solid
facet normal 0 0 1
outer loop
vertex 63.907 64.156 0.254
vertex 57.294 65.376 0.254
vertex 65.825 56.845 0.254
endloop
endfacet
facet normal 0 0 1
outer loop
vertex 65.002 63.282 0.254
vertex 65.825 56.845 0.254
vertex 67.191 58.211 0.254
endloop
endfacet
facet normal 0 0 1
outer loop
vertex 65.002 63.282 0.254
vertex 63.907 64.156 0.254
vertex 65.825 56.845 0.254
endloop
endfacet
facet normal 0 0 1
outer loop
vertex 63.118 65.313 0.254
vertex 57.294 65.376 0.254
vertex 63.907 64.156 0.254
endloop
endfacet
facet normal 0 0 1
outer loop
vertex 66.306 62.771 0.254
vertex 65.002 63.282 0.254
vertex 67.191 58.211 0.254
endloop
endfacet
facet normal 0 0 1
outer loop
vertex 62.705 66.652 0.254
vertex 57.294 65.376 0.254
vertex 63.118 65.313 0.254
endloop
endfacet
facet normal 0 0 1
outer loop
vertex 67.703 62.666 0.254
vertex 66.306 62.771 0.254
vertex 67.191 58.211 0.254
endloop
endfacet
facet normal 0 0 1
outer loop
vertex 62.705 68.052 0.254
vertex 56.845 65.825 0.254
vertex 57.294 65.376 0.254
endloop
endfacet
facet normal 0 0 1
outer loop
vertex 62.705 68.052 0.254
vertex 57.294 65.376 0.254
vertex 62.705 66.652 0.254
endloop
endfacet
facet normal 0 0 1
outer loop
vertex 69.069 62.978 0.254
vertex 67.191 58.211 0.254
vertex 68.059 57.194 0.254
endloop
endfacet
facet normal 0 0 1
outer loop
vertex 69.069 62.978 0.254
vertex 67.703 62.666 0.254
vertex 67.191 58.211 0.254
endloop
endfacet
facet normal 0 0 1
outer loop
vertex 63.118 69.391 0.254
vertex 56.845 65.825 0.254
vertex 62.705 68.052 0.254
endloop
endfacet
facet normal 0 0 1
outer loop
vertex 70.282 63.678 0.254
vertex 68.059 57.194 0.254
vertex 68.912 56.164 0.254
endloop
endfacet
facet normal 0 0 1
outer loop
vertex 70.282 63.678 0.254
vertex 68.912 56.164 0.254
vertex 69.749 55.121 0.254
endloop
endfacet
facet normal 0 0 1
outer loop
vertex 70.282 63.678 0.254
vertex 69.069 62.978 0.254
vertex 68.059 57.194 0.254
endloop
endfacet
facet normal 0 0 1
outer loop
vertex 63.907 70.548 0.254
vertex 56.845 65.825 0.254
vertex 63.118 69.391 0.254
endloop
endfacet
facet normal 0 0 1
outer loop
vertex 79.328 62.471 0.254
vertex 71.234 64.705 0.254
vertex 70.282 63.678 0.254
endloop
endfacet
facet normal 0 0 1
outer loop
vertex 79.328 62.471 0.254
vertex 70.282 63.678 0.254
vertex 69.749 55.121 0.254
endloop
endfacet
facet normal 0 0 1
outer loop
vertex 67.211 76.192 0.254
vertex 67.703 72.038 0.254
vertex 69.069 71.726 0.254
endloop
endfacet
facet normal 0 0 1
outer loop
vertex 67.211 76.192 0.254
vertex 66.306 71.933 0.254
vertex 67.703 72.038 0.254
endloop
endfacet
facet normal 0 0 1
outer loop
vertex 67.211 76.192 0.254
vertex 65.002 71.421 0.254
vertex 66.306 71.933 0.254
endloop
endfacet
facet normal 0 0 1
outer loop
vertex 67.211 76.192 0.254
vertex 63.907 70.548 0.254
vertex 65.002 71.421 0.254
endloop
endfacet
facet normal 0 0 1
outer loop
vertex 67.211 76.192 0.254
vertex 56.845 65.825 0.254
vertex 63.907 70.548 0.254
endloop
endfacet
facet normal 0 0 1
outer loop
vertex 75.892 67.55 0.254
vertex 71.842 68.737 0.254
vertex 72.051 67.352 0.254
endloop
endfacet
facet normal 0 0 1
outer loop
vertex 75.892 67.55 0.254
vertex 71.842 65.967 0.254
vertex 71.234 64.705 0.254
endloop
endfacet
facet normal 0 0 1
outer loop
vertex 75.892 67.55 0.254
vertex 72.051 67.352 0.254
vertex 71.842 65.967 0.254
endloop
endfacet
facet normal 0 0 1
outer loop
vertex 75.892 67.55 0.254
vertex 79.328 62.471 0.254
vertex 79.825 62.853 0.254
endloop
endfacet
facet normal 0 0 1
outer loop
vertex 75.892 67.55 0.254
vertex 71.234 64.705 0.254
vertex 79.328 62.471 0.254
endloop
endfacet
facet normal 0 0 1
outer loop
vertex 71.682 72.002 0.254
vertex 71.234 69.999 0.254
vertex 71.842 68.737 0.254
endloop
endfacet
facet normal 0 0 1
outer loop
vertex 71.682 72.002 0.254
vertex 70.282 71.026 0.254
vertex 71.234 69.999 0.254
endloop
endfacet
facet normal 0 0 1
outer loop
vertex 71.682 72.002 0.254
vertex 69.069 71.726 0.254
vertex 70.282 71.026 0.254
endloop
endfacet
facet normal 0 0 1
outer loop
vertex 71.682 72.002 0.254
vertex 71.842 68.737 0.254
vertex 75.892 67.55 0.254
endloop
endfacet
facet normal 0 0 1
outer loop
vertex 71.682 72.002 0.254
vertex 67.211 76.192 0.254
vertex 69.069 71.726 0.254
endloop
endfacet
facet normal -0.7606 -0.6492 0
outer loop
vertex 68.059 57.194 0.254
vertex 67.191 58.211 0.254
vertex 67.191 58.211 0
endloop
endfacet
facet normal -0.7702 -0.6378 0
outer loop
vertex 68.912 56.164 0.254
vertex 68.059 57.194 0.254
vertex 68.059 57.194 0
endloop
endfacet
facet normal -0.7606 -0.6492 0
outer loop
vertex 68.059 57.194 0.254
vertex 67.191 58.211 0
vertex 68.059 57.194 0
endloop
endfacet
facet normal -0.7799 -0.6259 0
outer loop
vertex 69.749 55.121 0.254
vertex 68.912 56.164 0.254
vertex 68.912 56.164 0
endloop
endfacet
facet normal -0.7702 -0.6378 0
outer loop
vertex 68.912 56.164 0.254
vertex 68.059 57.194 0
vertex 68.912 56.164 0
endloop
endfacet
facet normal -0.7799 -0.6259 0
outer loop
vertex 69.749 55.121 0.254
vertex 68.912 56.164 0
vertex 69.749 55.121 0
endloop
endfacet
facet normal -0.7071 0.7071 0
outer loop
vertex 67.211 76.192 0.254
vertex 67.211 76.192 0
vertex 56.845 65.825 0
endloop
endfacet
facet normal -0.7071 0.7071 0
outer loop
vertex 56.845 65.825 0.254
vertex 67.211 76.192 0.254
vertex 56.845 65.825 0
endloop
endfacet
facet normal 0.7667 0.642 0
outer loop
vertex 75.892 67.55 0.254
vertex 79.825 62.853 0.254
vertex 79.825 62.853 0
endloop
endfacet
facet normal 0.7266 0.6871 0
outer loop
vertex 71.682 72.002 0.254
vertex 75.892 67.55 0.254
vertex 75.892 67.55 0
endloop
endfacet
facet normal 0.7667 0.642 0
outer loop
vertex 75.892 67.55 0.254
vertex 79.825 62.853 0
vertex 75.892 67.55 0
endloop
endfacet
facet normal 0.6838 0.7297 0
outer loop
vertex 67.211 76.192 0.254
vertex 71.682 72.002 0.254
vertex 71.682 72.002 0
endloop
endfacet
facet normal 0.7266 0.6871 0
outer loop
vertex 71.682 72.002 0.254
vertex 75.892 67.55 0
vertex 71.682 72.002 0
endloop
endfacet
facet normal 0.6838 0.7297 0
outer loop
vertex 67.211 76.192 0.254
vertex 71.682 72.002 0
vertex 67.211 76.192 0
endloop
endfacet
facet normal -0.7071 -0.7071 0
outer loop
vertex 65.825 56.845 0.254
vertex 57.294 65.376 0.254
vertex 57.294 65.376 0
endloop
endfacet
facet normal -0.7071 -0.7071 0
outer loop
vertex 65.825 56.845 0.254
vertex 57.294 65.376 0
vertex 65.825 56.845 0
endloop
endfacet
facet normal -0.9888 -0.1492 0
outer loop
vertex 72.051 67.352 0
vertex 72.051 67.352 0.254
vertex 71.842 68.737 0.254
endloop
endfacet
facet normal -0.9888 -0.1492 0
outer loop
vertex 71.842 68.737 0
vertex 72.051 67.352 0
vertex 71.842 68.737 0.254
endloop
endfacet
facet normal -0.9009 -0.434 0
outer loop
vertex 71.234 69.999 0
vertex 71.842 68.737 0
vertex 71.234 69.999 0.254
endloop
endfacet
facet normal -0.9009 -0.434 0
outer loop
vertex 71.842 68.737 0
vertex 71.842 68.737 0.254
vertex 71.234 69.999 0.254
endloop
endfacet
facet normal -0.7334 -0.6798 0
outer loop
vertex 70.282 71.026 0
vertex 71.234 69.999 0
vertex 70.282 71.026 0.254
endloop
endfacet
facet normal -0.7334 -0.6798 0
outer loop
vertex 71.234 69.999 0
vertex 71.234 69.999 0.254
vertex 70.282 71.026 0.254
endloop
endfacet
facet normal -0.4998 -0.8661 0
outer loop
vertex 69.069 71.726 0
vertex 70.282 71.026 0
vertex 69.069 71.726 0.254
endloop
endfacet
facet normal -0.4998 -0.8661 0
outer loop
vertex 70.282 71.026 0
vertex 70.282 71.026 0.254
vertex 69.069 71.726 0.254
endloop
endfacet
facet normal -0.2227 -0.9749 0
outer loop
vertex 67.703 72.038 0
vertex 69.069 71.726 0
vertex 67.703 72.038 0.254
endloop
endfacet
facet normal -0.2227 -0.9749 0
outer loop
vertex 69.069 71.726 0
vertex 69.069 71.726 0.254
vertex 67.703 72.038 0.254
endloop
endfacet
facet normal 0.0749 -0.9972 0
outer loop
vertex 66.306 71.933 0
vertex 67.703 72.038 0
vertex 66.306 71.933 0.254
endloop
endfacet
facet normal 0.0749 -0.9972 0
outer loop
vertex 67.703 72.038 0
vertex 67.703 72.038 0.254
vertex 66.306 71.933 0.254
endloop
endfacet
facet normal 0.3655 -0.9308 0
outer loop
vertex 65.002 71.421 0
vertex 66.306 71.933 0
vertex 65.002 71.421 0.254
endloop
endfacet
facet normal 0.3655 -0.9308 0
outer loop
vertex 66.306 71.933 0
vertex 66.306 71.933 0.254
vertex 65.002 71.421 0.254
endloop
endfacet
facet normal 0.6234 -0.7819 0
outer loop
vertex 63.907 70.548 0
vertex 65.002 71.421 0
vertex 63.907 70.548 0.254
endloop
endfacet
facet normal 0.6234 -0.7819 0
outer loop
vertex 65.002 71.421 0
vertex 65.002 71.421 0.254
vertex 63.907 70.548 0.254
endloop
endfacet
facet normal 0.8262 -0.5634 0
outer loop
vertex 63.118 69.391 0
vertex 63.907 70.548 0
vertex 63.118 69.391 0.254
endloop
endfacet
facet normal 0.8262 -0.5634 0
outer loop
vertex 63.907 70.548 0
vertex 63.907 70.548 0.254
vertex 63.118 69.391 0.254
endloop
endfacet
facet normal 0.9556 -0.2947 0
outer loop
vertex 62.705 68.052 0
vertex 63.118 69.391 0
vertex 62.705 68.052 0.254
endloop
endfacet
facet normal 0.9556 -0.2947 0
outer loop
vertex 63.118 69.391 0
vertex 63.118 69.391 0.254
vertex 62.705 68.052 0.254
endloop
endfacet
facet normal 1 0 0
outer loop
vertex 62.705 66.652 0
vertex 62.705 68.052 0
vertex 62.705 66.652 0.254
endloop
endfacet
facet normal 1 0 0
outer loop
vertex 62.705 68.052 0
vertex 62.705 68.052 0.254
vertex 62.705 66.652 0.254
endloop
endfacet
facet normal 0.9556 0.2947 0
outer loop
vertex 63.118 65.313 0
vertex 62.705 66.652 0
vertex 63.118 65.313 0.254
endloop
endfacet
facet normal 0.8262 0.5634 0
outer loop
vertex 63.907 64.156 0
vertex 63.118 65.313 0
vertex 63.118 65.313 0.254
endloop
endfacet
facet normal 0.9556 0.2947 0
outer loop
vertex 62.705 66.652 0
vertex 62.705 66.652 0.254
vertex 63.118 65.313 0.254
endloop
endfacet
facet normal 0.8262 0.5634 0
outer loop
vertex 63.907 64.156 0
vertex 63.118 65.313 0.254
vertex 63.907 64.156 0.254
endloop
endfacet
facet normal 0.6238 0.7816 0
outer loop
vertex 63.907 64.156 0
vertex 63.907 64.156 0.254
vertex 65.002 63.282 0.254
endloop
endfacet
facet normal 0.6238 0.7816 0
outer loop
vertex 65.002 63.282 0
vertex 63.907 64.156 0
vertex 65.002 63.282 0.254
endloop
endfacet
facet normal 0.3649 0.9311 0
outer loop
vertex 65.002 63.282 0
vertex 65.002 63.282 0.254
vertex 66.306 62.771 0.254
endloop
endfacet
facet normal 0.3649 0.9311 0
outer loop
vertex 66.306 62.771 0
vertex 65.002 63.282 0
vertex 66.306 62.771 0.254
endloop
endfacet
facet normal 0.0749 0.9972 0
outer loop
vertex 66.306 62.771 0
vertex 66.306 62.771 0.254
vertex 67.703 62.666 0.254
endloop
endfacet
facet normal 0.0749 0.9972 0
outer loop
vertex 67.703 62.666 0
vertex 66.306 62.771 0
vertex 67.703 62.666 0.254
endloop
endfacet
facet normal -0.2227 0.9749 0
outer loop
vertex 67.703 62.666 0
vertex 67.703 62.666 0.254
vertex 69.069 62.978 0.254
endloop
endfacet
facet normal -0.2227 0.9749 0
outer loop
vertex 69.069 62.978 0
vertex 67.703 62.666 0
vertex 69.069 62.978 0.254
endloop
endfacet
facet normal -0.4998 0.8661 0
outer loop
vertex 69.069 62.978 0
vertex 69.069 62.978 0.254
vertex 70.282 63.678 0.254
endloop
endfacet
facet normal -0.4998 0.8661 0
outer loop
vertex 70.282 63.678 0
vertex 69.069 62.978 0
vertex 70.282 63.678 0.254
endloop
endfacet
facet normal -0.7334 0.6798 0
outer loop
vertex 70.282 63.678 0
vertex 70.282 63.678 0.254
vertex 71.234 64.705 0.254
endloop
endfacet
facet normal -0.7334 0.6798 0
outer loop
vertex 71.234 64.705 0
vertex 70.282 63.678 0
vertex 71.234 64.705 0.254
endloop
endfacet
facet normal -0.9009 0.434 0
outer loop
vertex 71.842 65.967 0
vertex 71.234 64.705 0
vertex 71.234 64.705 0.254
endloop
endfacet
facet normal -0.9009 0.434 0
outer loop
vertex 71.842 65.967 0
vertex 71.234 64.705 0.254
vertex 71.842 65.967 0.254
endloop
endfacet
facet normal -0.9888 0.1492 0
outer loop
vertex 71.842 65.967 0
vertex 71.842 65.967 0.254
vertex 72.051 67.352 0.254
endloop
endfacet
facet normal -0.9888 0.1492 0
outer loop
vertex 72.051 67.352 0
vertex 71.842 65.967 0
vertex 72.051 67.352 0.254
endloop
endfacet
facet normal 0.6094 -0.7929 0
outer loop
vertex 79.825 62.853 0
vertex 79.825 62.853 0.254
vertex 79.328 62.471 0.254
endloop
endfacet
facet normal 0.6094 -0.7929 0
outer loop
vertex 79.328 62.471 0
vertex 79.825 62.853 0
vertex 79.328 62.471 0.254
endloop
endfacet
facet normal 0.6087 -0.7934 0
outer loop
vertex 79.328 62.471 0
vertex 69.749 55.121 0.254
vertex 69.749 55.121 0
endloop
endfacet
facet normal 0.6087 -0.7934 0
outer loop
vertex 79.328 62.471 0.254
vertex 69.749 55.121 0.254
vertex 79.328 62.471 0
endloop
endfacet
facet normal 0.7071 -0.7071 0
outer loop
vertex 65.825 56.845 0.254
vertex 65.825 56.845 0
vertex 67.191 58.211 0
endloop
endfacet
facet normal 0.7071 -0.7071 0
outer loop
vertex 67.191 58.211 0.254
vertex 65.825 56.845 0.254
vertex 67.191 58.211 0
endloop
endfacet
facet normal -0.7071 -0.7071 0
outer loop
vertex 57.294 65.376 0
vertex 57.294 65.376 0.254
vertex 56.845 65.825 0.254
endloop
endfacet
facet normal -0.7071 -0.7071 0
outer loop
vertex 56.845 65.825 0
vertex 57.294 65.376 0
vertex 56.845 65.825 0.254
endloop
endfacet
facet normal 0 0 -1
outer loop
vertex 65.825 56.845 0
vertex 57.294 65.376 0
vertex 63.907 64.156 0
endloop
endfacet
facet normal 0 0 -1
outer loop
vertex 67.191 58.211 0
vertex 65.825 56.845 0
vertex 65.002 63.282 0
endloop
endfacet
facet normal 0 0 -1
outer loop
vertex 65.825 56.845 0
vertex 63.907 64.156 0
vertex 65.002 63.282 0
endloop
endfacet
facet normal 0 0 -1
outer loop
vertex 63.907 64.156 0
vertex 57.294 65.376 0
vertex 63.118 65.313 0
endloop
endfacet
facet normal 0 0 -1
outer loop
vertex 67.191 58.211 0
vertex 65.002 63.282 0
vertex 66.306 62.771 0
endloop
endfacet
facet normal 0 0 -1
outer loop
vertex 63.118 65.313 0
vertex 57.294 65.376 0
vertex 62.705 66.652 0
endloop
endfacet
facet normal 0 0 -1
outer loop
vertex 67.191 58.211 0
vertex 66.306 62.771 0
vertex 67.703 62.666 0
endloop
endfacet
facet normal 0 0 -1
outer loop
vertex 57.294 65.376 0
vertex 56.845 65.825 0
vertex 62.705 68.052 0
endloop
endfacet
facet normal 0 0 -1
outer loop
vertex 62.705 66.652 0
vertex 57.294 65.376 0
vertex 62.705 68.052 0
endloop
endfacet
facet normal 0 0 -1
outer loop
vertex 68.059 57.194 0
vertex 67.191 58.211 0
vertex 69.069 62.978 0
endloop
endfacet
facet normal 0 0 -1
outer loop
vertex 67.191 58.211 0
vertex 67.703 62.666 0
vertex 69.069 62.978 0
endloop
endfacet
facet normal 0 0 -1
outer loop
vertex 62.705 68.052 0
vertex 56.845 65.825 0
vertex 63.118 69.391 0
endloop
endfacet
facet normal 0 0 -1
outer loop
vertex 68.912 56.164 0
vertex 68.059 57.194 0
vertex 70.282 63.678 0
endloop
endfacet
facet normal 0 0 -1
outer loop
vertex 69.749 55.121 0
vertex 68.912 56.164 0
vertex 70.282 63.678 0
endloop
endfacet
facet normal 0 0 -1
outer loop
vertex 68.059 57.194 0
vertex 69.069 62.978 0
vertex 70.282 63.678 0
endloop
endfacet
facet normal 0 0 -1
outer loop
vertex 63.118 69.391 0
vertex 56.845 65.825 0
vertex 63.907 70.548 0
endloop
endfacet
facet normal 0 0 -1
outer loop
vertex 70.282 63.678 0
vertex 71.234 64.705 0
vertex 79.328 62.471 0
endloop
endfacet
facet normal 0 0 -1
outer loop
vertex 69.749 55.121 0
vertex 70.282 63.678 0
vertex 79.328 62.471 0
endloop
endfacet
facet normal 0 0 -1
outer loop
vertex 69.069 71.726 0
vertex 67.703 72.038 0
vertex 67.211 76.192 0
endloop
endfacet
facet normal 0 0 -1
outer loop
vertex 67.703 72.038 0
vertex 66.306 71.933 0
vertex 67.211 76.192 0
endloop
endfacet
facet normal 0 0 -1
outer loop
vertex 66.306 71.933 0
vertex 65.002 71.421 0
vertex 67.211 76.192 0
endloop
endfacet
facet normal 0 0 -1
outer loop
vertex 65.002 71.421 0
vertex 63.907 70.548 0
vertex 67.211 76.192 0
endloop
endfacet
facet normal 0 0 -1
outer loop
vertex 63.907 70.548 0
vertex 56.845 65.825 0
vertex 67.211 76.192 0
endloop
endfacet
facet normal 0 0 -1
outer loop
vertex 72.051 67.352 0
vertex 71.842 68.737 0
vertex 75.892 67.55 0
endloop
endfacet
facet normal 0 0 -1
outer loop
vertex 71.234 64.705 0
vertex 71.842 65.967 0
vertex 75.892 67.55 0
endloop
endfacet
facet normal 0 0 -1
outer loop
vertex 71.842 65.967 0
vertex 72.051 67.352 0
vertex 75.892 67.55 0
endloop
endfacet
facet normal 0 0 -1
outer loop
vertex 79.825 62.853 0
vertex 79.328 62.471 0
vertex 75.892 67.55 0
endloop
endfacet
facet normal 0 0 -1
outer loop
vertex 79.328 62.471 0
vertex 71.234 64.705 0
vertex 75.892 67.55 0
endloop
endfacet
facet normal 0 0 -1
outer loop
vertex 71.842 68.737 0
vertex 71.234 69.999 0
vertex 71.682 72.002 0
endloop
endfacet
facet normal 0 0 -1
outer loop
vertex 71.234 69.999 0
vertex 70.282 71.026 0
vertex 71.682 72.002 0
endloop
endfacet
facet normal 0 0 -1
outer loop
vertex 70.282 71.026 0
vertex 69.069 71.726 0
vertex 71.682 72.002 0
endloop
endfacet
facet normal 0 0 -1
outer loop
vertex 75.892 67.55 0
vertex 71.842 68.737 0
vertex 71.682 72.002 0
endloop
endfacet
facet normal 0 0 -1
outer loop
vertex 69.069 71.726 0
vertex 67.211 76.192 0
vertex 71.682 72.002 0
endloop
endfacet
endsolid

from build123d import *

# Parameters (mm, degrees)
BOSS_EXTRUDE1_DEPTH = 0.254
SKETCH2_R           = 4.699
CUT_EXTRUDE1_DEPTH  = 1.254
SKETCH3_W           = 2.54
SKETCH3_H           = 0.635
CUT_EXTRUDE2_DEPTH  = 1.254
SKETCH5_OUTSIDE_W   = 121.447
SKETCH5_OUTSIDE_H   = 109.618
CUT_EXTRUDE5_DEPTH  = 1.254


with BuildPart() as part:
    # Sketch1 → Boss-Extrude1 (new body)
    with BuildSketch(Plane.XY):
        with BuildLine():
            Line((67.21146711, 76.191723231), (8.696654013, 17.676910134))
            Line((8.696654013, 17.676910134), (7.228954972, 14.133571205))
            ThreePointArc((7.228954972, 14.133571205), (14.666587579, 6.075099489), (15.105587123, -4.88230096))
            Line((15.105587123, -4.88230096), (18.648926052, -6.35))
            Line((18.648926052, -6.35), (101.401368334, -6.35))
            ThreePointArc((101.401368334, -6.35), (93.866160503, 38.880636728), (67.21146711, 76.191723231))
        make_face()
        with BuildLine():
            Line((88.672924278, 6.35), (27.86051193, 6.35))
            ThreePointArc((27.86051193, 6.35), (26.399857642, 10.93517908), (24.190484974, 15.210228852))
            Line((24.190484974, 15.210228852), (67.191354125, 58.211098004))
            ThreePointArc((67.191354125, 58.211098004), (82.13289044, 34.020557137), (88.672924278, 6.35))
        make_face(mode=Mode.SUBTRACT)
    extrude(amount=BOSS_EXTRUDE1_DEPTH)

    # Sketch2 → Cut-Extrude1 (cut, through all)
    with BuildSketch(Plane.XY.offset(0.254)):
        with Locations((22.225, 0)):
            Circle(SKETCH2_R)
        with Locations((36.195, 0)):
            Circle(SKETCH2_R)
        with Locations((61.722, 0)):
            Circle(SKETCH2_R)
        with Locations((75.692, 0)):
            Circle(SKETCH2_R)
        with Locations((95.25, 0)):
            Circle(SKETCH2_R)
        with Locations((15.715448212, 15.715448212)):
            Circle(SKETCH2_R)
        with Locations((25.593729945, 25.593729945)):
            Circle(SKETCH2_R)
        with Locations((43.644044748, 43.644044748)):
            Circle(SKETCH2_R)
        with Locations((53.522326482, 53.522326482)):
            Circle(SKETCH2_R)
        with Locations((92.004434954, 24.652514046)):
            Circle(SKETCH2_R)
        with Locations((82.48891971, 47.625)):
            Circle(SKETCH2_R)
        with Locations((67.351920908, 67.351920908)):
            Circle(SKETCH2_R)
    extrude(amount=-CUT_EXTRUDE1_DEPTH, mode=Mode.SUBTRACT)

    # Sketch3 → Cut-Extrude2 (cut, through all)
    with BuildSketch(Plane.XY.offset(0.254)):
        Polygon((15.266435406, 24.246691527), (17.06248663, 26.042742751), (17.511499436, 25.593729945), (15.715448212, 23.797678721), align=None)
        Polygon((44.991083167, 53.971339288), (43.195031942, 52.175288063), (43.644044748, 51.726275257), (45.440095973, 53.522326482), align=None)
        with Locations((29.21, -6.0325)):
            Rectangle(SKETCH3_W, SKETCH3_H)
        with Locations((68.707, -6.0325)):
            Rectangle(SKETCH3_W, SKETCH3_H)
        Polygon((29.230733674, 38.210989795), (31.026784898, 40.007041019), (31.475797704, 39.558028213), (29.67974648, 37.761976989), align=None)
        Polygon((56.845021246, 65.825277367), (55.048970022, 64.029226143), (55.497982828, 63.580213337), (57.294034052, 65.376264561), align=None)
        with Locations((48.9585, -6.0325)):
            Rectangle(SKETCH3_W, SKETCH3_H)
        with Locations((85.471, -6.0325)):
            Rectangle(SKETCH3_W, SKETCH3_H)
        Polygon((99.935462164, 14.437711971), (100.266998693, 11.919442024), (101.526133667, 12.085210288), (101.194597138, 14.603480236), align=None)
        Polygon((93.765504959, 37.464305742), (94.938831965, 37.950313702), (93.966816047, 40.296967714), (92.793489041, 39.810959755), align=None)
        Polygon((79.327792988, 62.471156422), (80.874047017, 60.456038938), (81.88160576, 61.229165953), (80.33535173, 63.244283437), align=None)
        Polygon((13.593916116, 7.005422516), (14.565932035, 4.658768503), (15.739259041, 5.144776462), (14.767243123, 7.491430475), align=None)
    extrude(amount=-CUT_EXTRUDE2_DEPTH, mode=Mode.SUBTRACT)

    # Sketch5 outside → Cut-Extrude5 (cut, through all)
    with BuildSketch(Plane.XY.offset(0.254)):
        with Locations((54.4145, 34.921)):
            Rectangle(SKETCH5_OUTSIDE_W, SKETCH5_OUTSIDE_H)
        Polygon((55.946995634, 66.72330298), (68.504300263, 54.16599835), (81.410712434, 64.069436727), (67.351920908, 78.128228253), align=None, mode=Mode.SUBTRACT)
    extrude(amount=-CUT_EXTRUDE5_DEPTH, mode=Mode.SUBTRACT)


solid = part.part
